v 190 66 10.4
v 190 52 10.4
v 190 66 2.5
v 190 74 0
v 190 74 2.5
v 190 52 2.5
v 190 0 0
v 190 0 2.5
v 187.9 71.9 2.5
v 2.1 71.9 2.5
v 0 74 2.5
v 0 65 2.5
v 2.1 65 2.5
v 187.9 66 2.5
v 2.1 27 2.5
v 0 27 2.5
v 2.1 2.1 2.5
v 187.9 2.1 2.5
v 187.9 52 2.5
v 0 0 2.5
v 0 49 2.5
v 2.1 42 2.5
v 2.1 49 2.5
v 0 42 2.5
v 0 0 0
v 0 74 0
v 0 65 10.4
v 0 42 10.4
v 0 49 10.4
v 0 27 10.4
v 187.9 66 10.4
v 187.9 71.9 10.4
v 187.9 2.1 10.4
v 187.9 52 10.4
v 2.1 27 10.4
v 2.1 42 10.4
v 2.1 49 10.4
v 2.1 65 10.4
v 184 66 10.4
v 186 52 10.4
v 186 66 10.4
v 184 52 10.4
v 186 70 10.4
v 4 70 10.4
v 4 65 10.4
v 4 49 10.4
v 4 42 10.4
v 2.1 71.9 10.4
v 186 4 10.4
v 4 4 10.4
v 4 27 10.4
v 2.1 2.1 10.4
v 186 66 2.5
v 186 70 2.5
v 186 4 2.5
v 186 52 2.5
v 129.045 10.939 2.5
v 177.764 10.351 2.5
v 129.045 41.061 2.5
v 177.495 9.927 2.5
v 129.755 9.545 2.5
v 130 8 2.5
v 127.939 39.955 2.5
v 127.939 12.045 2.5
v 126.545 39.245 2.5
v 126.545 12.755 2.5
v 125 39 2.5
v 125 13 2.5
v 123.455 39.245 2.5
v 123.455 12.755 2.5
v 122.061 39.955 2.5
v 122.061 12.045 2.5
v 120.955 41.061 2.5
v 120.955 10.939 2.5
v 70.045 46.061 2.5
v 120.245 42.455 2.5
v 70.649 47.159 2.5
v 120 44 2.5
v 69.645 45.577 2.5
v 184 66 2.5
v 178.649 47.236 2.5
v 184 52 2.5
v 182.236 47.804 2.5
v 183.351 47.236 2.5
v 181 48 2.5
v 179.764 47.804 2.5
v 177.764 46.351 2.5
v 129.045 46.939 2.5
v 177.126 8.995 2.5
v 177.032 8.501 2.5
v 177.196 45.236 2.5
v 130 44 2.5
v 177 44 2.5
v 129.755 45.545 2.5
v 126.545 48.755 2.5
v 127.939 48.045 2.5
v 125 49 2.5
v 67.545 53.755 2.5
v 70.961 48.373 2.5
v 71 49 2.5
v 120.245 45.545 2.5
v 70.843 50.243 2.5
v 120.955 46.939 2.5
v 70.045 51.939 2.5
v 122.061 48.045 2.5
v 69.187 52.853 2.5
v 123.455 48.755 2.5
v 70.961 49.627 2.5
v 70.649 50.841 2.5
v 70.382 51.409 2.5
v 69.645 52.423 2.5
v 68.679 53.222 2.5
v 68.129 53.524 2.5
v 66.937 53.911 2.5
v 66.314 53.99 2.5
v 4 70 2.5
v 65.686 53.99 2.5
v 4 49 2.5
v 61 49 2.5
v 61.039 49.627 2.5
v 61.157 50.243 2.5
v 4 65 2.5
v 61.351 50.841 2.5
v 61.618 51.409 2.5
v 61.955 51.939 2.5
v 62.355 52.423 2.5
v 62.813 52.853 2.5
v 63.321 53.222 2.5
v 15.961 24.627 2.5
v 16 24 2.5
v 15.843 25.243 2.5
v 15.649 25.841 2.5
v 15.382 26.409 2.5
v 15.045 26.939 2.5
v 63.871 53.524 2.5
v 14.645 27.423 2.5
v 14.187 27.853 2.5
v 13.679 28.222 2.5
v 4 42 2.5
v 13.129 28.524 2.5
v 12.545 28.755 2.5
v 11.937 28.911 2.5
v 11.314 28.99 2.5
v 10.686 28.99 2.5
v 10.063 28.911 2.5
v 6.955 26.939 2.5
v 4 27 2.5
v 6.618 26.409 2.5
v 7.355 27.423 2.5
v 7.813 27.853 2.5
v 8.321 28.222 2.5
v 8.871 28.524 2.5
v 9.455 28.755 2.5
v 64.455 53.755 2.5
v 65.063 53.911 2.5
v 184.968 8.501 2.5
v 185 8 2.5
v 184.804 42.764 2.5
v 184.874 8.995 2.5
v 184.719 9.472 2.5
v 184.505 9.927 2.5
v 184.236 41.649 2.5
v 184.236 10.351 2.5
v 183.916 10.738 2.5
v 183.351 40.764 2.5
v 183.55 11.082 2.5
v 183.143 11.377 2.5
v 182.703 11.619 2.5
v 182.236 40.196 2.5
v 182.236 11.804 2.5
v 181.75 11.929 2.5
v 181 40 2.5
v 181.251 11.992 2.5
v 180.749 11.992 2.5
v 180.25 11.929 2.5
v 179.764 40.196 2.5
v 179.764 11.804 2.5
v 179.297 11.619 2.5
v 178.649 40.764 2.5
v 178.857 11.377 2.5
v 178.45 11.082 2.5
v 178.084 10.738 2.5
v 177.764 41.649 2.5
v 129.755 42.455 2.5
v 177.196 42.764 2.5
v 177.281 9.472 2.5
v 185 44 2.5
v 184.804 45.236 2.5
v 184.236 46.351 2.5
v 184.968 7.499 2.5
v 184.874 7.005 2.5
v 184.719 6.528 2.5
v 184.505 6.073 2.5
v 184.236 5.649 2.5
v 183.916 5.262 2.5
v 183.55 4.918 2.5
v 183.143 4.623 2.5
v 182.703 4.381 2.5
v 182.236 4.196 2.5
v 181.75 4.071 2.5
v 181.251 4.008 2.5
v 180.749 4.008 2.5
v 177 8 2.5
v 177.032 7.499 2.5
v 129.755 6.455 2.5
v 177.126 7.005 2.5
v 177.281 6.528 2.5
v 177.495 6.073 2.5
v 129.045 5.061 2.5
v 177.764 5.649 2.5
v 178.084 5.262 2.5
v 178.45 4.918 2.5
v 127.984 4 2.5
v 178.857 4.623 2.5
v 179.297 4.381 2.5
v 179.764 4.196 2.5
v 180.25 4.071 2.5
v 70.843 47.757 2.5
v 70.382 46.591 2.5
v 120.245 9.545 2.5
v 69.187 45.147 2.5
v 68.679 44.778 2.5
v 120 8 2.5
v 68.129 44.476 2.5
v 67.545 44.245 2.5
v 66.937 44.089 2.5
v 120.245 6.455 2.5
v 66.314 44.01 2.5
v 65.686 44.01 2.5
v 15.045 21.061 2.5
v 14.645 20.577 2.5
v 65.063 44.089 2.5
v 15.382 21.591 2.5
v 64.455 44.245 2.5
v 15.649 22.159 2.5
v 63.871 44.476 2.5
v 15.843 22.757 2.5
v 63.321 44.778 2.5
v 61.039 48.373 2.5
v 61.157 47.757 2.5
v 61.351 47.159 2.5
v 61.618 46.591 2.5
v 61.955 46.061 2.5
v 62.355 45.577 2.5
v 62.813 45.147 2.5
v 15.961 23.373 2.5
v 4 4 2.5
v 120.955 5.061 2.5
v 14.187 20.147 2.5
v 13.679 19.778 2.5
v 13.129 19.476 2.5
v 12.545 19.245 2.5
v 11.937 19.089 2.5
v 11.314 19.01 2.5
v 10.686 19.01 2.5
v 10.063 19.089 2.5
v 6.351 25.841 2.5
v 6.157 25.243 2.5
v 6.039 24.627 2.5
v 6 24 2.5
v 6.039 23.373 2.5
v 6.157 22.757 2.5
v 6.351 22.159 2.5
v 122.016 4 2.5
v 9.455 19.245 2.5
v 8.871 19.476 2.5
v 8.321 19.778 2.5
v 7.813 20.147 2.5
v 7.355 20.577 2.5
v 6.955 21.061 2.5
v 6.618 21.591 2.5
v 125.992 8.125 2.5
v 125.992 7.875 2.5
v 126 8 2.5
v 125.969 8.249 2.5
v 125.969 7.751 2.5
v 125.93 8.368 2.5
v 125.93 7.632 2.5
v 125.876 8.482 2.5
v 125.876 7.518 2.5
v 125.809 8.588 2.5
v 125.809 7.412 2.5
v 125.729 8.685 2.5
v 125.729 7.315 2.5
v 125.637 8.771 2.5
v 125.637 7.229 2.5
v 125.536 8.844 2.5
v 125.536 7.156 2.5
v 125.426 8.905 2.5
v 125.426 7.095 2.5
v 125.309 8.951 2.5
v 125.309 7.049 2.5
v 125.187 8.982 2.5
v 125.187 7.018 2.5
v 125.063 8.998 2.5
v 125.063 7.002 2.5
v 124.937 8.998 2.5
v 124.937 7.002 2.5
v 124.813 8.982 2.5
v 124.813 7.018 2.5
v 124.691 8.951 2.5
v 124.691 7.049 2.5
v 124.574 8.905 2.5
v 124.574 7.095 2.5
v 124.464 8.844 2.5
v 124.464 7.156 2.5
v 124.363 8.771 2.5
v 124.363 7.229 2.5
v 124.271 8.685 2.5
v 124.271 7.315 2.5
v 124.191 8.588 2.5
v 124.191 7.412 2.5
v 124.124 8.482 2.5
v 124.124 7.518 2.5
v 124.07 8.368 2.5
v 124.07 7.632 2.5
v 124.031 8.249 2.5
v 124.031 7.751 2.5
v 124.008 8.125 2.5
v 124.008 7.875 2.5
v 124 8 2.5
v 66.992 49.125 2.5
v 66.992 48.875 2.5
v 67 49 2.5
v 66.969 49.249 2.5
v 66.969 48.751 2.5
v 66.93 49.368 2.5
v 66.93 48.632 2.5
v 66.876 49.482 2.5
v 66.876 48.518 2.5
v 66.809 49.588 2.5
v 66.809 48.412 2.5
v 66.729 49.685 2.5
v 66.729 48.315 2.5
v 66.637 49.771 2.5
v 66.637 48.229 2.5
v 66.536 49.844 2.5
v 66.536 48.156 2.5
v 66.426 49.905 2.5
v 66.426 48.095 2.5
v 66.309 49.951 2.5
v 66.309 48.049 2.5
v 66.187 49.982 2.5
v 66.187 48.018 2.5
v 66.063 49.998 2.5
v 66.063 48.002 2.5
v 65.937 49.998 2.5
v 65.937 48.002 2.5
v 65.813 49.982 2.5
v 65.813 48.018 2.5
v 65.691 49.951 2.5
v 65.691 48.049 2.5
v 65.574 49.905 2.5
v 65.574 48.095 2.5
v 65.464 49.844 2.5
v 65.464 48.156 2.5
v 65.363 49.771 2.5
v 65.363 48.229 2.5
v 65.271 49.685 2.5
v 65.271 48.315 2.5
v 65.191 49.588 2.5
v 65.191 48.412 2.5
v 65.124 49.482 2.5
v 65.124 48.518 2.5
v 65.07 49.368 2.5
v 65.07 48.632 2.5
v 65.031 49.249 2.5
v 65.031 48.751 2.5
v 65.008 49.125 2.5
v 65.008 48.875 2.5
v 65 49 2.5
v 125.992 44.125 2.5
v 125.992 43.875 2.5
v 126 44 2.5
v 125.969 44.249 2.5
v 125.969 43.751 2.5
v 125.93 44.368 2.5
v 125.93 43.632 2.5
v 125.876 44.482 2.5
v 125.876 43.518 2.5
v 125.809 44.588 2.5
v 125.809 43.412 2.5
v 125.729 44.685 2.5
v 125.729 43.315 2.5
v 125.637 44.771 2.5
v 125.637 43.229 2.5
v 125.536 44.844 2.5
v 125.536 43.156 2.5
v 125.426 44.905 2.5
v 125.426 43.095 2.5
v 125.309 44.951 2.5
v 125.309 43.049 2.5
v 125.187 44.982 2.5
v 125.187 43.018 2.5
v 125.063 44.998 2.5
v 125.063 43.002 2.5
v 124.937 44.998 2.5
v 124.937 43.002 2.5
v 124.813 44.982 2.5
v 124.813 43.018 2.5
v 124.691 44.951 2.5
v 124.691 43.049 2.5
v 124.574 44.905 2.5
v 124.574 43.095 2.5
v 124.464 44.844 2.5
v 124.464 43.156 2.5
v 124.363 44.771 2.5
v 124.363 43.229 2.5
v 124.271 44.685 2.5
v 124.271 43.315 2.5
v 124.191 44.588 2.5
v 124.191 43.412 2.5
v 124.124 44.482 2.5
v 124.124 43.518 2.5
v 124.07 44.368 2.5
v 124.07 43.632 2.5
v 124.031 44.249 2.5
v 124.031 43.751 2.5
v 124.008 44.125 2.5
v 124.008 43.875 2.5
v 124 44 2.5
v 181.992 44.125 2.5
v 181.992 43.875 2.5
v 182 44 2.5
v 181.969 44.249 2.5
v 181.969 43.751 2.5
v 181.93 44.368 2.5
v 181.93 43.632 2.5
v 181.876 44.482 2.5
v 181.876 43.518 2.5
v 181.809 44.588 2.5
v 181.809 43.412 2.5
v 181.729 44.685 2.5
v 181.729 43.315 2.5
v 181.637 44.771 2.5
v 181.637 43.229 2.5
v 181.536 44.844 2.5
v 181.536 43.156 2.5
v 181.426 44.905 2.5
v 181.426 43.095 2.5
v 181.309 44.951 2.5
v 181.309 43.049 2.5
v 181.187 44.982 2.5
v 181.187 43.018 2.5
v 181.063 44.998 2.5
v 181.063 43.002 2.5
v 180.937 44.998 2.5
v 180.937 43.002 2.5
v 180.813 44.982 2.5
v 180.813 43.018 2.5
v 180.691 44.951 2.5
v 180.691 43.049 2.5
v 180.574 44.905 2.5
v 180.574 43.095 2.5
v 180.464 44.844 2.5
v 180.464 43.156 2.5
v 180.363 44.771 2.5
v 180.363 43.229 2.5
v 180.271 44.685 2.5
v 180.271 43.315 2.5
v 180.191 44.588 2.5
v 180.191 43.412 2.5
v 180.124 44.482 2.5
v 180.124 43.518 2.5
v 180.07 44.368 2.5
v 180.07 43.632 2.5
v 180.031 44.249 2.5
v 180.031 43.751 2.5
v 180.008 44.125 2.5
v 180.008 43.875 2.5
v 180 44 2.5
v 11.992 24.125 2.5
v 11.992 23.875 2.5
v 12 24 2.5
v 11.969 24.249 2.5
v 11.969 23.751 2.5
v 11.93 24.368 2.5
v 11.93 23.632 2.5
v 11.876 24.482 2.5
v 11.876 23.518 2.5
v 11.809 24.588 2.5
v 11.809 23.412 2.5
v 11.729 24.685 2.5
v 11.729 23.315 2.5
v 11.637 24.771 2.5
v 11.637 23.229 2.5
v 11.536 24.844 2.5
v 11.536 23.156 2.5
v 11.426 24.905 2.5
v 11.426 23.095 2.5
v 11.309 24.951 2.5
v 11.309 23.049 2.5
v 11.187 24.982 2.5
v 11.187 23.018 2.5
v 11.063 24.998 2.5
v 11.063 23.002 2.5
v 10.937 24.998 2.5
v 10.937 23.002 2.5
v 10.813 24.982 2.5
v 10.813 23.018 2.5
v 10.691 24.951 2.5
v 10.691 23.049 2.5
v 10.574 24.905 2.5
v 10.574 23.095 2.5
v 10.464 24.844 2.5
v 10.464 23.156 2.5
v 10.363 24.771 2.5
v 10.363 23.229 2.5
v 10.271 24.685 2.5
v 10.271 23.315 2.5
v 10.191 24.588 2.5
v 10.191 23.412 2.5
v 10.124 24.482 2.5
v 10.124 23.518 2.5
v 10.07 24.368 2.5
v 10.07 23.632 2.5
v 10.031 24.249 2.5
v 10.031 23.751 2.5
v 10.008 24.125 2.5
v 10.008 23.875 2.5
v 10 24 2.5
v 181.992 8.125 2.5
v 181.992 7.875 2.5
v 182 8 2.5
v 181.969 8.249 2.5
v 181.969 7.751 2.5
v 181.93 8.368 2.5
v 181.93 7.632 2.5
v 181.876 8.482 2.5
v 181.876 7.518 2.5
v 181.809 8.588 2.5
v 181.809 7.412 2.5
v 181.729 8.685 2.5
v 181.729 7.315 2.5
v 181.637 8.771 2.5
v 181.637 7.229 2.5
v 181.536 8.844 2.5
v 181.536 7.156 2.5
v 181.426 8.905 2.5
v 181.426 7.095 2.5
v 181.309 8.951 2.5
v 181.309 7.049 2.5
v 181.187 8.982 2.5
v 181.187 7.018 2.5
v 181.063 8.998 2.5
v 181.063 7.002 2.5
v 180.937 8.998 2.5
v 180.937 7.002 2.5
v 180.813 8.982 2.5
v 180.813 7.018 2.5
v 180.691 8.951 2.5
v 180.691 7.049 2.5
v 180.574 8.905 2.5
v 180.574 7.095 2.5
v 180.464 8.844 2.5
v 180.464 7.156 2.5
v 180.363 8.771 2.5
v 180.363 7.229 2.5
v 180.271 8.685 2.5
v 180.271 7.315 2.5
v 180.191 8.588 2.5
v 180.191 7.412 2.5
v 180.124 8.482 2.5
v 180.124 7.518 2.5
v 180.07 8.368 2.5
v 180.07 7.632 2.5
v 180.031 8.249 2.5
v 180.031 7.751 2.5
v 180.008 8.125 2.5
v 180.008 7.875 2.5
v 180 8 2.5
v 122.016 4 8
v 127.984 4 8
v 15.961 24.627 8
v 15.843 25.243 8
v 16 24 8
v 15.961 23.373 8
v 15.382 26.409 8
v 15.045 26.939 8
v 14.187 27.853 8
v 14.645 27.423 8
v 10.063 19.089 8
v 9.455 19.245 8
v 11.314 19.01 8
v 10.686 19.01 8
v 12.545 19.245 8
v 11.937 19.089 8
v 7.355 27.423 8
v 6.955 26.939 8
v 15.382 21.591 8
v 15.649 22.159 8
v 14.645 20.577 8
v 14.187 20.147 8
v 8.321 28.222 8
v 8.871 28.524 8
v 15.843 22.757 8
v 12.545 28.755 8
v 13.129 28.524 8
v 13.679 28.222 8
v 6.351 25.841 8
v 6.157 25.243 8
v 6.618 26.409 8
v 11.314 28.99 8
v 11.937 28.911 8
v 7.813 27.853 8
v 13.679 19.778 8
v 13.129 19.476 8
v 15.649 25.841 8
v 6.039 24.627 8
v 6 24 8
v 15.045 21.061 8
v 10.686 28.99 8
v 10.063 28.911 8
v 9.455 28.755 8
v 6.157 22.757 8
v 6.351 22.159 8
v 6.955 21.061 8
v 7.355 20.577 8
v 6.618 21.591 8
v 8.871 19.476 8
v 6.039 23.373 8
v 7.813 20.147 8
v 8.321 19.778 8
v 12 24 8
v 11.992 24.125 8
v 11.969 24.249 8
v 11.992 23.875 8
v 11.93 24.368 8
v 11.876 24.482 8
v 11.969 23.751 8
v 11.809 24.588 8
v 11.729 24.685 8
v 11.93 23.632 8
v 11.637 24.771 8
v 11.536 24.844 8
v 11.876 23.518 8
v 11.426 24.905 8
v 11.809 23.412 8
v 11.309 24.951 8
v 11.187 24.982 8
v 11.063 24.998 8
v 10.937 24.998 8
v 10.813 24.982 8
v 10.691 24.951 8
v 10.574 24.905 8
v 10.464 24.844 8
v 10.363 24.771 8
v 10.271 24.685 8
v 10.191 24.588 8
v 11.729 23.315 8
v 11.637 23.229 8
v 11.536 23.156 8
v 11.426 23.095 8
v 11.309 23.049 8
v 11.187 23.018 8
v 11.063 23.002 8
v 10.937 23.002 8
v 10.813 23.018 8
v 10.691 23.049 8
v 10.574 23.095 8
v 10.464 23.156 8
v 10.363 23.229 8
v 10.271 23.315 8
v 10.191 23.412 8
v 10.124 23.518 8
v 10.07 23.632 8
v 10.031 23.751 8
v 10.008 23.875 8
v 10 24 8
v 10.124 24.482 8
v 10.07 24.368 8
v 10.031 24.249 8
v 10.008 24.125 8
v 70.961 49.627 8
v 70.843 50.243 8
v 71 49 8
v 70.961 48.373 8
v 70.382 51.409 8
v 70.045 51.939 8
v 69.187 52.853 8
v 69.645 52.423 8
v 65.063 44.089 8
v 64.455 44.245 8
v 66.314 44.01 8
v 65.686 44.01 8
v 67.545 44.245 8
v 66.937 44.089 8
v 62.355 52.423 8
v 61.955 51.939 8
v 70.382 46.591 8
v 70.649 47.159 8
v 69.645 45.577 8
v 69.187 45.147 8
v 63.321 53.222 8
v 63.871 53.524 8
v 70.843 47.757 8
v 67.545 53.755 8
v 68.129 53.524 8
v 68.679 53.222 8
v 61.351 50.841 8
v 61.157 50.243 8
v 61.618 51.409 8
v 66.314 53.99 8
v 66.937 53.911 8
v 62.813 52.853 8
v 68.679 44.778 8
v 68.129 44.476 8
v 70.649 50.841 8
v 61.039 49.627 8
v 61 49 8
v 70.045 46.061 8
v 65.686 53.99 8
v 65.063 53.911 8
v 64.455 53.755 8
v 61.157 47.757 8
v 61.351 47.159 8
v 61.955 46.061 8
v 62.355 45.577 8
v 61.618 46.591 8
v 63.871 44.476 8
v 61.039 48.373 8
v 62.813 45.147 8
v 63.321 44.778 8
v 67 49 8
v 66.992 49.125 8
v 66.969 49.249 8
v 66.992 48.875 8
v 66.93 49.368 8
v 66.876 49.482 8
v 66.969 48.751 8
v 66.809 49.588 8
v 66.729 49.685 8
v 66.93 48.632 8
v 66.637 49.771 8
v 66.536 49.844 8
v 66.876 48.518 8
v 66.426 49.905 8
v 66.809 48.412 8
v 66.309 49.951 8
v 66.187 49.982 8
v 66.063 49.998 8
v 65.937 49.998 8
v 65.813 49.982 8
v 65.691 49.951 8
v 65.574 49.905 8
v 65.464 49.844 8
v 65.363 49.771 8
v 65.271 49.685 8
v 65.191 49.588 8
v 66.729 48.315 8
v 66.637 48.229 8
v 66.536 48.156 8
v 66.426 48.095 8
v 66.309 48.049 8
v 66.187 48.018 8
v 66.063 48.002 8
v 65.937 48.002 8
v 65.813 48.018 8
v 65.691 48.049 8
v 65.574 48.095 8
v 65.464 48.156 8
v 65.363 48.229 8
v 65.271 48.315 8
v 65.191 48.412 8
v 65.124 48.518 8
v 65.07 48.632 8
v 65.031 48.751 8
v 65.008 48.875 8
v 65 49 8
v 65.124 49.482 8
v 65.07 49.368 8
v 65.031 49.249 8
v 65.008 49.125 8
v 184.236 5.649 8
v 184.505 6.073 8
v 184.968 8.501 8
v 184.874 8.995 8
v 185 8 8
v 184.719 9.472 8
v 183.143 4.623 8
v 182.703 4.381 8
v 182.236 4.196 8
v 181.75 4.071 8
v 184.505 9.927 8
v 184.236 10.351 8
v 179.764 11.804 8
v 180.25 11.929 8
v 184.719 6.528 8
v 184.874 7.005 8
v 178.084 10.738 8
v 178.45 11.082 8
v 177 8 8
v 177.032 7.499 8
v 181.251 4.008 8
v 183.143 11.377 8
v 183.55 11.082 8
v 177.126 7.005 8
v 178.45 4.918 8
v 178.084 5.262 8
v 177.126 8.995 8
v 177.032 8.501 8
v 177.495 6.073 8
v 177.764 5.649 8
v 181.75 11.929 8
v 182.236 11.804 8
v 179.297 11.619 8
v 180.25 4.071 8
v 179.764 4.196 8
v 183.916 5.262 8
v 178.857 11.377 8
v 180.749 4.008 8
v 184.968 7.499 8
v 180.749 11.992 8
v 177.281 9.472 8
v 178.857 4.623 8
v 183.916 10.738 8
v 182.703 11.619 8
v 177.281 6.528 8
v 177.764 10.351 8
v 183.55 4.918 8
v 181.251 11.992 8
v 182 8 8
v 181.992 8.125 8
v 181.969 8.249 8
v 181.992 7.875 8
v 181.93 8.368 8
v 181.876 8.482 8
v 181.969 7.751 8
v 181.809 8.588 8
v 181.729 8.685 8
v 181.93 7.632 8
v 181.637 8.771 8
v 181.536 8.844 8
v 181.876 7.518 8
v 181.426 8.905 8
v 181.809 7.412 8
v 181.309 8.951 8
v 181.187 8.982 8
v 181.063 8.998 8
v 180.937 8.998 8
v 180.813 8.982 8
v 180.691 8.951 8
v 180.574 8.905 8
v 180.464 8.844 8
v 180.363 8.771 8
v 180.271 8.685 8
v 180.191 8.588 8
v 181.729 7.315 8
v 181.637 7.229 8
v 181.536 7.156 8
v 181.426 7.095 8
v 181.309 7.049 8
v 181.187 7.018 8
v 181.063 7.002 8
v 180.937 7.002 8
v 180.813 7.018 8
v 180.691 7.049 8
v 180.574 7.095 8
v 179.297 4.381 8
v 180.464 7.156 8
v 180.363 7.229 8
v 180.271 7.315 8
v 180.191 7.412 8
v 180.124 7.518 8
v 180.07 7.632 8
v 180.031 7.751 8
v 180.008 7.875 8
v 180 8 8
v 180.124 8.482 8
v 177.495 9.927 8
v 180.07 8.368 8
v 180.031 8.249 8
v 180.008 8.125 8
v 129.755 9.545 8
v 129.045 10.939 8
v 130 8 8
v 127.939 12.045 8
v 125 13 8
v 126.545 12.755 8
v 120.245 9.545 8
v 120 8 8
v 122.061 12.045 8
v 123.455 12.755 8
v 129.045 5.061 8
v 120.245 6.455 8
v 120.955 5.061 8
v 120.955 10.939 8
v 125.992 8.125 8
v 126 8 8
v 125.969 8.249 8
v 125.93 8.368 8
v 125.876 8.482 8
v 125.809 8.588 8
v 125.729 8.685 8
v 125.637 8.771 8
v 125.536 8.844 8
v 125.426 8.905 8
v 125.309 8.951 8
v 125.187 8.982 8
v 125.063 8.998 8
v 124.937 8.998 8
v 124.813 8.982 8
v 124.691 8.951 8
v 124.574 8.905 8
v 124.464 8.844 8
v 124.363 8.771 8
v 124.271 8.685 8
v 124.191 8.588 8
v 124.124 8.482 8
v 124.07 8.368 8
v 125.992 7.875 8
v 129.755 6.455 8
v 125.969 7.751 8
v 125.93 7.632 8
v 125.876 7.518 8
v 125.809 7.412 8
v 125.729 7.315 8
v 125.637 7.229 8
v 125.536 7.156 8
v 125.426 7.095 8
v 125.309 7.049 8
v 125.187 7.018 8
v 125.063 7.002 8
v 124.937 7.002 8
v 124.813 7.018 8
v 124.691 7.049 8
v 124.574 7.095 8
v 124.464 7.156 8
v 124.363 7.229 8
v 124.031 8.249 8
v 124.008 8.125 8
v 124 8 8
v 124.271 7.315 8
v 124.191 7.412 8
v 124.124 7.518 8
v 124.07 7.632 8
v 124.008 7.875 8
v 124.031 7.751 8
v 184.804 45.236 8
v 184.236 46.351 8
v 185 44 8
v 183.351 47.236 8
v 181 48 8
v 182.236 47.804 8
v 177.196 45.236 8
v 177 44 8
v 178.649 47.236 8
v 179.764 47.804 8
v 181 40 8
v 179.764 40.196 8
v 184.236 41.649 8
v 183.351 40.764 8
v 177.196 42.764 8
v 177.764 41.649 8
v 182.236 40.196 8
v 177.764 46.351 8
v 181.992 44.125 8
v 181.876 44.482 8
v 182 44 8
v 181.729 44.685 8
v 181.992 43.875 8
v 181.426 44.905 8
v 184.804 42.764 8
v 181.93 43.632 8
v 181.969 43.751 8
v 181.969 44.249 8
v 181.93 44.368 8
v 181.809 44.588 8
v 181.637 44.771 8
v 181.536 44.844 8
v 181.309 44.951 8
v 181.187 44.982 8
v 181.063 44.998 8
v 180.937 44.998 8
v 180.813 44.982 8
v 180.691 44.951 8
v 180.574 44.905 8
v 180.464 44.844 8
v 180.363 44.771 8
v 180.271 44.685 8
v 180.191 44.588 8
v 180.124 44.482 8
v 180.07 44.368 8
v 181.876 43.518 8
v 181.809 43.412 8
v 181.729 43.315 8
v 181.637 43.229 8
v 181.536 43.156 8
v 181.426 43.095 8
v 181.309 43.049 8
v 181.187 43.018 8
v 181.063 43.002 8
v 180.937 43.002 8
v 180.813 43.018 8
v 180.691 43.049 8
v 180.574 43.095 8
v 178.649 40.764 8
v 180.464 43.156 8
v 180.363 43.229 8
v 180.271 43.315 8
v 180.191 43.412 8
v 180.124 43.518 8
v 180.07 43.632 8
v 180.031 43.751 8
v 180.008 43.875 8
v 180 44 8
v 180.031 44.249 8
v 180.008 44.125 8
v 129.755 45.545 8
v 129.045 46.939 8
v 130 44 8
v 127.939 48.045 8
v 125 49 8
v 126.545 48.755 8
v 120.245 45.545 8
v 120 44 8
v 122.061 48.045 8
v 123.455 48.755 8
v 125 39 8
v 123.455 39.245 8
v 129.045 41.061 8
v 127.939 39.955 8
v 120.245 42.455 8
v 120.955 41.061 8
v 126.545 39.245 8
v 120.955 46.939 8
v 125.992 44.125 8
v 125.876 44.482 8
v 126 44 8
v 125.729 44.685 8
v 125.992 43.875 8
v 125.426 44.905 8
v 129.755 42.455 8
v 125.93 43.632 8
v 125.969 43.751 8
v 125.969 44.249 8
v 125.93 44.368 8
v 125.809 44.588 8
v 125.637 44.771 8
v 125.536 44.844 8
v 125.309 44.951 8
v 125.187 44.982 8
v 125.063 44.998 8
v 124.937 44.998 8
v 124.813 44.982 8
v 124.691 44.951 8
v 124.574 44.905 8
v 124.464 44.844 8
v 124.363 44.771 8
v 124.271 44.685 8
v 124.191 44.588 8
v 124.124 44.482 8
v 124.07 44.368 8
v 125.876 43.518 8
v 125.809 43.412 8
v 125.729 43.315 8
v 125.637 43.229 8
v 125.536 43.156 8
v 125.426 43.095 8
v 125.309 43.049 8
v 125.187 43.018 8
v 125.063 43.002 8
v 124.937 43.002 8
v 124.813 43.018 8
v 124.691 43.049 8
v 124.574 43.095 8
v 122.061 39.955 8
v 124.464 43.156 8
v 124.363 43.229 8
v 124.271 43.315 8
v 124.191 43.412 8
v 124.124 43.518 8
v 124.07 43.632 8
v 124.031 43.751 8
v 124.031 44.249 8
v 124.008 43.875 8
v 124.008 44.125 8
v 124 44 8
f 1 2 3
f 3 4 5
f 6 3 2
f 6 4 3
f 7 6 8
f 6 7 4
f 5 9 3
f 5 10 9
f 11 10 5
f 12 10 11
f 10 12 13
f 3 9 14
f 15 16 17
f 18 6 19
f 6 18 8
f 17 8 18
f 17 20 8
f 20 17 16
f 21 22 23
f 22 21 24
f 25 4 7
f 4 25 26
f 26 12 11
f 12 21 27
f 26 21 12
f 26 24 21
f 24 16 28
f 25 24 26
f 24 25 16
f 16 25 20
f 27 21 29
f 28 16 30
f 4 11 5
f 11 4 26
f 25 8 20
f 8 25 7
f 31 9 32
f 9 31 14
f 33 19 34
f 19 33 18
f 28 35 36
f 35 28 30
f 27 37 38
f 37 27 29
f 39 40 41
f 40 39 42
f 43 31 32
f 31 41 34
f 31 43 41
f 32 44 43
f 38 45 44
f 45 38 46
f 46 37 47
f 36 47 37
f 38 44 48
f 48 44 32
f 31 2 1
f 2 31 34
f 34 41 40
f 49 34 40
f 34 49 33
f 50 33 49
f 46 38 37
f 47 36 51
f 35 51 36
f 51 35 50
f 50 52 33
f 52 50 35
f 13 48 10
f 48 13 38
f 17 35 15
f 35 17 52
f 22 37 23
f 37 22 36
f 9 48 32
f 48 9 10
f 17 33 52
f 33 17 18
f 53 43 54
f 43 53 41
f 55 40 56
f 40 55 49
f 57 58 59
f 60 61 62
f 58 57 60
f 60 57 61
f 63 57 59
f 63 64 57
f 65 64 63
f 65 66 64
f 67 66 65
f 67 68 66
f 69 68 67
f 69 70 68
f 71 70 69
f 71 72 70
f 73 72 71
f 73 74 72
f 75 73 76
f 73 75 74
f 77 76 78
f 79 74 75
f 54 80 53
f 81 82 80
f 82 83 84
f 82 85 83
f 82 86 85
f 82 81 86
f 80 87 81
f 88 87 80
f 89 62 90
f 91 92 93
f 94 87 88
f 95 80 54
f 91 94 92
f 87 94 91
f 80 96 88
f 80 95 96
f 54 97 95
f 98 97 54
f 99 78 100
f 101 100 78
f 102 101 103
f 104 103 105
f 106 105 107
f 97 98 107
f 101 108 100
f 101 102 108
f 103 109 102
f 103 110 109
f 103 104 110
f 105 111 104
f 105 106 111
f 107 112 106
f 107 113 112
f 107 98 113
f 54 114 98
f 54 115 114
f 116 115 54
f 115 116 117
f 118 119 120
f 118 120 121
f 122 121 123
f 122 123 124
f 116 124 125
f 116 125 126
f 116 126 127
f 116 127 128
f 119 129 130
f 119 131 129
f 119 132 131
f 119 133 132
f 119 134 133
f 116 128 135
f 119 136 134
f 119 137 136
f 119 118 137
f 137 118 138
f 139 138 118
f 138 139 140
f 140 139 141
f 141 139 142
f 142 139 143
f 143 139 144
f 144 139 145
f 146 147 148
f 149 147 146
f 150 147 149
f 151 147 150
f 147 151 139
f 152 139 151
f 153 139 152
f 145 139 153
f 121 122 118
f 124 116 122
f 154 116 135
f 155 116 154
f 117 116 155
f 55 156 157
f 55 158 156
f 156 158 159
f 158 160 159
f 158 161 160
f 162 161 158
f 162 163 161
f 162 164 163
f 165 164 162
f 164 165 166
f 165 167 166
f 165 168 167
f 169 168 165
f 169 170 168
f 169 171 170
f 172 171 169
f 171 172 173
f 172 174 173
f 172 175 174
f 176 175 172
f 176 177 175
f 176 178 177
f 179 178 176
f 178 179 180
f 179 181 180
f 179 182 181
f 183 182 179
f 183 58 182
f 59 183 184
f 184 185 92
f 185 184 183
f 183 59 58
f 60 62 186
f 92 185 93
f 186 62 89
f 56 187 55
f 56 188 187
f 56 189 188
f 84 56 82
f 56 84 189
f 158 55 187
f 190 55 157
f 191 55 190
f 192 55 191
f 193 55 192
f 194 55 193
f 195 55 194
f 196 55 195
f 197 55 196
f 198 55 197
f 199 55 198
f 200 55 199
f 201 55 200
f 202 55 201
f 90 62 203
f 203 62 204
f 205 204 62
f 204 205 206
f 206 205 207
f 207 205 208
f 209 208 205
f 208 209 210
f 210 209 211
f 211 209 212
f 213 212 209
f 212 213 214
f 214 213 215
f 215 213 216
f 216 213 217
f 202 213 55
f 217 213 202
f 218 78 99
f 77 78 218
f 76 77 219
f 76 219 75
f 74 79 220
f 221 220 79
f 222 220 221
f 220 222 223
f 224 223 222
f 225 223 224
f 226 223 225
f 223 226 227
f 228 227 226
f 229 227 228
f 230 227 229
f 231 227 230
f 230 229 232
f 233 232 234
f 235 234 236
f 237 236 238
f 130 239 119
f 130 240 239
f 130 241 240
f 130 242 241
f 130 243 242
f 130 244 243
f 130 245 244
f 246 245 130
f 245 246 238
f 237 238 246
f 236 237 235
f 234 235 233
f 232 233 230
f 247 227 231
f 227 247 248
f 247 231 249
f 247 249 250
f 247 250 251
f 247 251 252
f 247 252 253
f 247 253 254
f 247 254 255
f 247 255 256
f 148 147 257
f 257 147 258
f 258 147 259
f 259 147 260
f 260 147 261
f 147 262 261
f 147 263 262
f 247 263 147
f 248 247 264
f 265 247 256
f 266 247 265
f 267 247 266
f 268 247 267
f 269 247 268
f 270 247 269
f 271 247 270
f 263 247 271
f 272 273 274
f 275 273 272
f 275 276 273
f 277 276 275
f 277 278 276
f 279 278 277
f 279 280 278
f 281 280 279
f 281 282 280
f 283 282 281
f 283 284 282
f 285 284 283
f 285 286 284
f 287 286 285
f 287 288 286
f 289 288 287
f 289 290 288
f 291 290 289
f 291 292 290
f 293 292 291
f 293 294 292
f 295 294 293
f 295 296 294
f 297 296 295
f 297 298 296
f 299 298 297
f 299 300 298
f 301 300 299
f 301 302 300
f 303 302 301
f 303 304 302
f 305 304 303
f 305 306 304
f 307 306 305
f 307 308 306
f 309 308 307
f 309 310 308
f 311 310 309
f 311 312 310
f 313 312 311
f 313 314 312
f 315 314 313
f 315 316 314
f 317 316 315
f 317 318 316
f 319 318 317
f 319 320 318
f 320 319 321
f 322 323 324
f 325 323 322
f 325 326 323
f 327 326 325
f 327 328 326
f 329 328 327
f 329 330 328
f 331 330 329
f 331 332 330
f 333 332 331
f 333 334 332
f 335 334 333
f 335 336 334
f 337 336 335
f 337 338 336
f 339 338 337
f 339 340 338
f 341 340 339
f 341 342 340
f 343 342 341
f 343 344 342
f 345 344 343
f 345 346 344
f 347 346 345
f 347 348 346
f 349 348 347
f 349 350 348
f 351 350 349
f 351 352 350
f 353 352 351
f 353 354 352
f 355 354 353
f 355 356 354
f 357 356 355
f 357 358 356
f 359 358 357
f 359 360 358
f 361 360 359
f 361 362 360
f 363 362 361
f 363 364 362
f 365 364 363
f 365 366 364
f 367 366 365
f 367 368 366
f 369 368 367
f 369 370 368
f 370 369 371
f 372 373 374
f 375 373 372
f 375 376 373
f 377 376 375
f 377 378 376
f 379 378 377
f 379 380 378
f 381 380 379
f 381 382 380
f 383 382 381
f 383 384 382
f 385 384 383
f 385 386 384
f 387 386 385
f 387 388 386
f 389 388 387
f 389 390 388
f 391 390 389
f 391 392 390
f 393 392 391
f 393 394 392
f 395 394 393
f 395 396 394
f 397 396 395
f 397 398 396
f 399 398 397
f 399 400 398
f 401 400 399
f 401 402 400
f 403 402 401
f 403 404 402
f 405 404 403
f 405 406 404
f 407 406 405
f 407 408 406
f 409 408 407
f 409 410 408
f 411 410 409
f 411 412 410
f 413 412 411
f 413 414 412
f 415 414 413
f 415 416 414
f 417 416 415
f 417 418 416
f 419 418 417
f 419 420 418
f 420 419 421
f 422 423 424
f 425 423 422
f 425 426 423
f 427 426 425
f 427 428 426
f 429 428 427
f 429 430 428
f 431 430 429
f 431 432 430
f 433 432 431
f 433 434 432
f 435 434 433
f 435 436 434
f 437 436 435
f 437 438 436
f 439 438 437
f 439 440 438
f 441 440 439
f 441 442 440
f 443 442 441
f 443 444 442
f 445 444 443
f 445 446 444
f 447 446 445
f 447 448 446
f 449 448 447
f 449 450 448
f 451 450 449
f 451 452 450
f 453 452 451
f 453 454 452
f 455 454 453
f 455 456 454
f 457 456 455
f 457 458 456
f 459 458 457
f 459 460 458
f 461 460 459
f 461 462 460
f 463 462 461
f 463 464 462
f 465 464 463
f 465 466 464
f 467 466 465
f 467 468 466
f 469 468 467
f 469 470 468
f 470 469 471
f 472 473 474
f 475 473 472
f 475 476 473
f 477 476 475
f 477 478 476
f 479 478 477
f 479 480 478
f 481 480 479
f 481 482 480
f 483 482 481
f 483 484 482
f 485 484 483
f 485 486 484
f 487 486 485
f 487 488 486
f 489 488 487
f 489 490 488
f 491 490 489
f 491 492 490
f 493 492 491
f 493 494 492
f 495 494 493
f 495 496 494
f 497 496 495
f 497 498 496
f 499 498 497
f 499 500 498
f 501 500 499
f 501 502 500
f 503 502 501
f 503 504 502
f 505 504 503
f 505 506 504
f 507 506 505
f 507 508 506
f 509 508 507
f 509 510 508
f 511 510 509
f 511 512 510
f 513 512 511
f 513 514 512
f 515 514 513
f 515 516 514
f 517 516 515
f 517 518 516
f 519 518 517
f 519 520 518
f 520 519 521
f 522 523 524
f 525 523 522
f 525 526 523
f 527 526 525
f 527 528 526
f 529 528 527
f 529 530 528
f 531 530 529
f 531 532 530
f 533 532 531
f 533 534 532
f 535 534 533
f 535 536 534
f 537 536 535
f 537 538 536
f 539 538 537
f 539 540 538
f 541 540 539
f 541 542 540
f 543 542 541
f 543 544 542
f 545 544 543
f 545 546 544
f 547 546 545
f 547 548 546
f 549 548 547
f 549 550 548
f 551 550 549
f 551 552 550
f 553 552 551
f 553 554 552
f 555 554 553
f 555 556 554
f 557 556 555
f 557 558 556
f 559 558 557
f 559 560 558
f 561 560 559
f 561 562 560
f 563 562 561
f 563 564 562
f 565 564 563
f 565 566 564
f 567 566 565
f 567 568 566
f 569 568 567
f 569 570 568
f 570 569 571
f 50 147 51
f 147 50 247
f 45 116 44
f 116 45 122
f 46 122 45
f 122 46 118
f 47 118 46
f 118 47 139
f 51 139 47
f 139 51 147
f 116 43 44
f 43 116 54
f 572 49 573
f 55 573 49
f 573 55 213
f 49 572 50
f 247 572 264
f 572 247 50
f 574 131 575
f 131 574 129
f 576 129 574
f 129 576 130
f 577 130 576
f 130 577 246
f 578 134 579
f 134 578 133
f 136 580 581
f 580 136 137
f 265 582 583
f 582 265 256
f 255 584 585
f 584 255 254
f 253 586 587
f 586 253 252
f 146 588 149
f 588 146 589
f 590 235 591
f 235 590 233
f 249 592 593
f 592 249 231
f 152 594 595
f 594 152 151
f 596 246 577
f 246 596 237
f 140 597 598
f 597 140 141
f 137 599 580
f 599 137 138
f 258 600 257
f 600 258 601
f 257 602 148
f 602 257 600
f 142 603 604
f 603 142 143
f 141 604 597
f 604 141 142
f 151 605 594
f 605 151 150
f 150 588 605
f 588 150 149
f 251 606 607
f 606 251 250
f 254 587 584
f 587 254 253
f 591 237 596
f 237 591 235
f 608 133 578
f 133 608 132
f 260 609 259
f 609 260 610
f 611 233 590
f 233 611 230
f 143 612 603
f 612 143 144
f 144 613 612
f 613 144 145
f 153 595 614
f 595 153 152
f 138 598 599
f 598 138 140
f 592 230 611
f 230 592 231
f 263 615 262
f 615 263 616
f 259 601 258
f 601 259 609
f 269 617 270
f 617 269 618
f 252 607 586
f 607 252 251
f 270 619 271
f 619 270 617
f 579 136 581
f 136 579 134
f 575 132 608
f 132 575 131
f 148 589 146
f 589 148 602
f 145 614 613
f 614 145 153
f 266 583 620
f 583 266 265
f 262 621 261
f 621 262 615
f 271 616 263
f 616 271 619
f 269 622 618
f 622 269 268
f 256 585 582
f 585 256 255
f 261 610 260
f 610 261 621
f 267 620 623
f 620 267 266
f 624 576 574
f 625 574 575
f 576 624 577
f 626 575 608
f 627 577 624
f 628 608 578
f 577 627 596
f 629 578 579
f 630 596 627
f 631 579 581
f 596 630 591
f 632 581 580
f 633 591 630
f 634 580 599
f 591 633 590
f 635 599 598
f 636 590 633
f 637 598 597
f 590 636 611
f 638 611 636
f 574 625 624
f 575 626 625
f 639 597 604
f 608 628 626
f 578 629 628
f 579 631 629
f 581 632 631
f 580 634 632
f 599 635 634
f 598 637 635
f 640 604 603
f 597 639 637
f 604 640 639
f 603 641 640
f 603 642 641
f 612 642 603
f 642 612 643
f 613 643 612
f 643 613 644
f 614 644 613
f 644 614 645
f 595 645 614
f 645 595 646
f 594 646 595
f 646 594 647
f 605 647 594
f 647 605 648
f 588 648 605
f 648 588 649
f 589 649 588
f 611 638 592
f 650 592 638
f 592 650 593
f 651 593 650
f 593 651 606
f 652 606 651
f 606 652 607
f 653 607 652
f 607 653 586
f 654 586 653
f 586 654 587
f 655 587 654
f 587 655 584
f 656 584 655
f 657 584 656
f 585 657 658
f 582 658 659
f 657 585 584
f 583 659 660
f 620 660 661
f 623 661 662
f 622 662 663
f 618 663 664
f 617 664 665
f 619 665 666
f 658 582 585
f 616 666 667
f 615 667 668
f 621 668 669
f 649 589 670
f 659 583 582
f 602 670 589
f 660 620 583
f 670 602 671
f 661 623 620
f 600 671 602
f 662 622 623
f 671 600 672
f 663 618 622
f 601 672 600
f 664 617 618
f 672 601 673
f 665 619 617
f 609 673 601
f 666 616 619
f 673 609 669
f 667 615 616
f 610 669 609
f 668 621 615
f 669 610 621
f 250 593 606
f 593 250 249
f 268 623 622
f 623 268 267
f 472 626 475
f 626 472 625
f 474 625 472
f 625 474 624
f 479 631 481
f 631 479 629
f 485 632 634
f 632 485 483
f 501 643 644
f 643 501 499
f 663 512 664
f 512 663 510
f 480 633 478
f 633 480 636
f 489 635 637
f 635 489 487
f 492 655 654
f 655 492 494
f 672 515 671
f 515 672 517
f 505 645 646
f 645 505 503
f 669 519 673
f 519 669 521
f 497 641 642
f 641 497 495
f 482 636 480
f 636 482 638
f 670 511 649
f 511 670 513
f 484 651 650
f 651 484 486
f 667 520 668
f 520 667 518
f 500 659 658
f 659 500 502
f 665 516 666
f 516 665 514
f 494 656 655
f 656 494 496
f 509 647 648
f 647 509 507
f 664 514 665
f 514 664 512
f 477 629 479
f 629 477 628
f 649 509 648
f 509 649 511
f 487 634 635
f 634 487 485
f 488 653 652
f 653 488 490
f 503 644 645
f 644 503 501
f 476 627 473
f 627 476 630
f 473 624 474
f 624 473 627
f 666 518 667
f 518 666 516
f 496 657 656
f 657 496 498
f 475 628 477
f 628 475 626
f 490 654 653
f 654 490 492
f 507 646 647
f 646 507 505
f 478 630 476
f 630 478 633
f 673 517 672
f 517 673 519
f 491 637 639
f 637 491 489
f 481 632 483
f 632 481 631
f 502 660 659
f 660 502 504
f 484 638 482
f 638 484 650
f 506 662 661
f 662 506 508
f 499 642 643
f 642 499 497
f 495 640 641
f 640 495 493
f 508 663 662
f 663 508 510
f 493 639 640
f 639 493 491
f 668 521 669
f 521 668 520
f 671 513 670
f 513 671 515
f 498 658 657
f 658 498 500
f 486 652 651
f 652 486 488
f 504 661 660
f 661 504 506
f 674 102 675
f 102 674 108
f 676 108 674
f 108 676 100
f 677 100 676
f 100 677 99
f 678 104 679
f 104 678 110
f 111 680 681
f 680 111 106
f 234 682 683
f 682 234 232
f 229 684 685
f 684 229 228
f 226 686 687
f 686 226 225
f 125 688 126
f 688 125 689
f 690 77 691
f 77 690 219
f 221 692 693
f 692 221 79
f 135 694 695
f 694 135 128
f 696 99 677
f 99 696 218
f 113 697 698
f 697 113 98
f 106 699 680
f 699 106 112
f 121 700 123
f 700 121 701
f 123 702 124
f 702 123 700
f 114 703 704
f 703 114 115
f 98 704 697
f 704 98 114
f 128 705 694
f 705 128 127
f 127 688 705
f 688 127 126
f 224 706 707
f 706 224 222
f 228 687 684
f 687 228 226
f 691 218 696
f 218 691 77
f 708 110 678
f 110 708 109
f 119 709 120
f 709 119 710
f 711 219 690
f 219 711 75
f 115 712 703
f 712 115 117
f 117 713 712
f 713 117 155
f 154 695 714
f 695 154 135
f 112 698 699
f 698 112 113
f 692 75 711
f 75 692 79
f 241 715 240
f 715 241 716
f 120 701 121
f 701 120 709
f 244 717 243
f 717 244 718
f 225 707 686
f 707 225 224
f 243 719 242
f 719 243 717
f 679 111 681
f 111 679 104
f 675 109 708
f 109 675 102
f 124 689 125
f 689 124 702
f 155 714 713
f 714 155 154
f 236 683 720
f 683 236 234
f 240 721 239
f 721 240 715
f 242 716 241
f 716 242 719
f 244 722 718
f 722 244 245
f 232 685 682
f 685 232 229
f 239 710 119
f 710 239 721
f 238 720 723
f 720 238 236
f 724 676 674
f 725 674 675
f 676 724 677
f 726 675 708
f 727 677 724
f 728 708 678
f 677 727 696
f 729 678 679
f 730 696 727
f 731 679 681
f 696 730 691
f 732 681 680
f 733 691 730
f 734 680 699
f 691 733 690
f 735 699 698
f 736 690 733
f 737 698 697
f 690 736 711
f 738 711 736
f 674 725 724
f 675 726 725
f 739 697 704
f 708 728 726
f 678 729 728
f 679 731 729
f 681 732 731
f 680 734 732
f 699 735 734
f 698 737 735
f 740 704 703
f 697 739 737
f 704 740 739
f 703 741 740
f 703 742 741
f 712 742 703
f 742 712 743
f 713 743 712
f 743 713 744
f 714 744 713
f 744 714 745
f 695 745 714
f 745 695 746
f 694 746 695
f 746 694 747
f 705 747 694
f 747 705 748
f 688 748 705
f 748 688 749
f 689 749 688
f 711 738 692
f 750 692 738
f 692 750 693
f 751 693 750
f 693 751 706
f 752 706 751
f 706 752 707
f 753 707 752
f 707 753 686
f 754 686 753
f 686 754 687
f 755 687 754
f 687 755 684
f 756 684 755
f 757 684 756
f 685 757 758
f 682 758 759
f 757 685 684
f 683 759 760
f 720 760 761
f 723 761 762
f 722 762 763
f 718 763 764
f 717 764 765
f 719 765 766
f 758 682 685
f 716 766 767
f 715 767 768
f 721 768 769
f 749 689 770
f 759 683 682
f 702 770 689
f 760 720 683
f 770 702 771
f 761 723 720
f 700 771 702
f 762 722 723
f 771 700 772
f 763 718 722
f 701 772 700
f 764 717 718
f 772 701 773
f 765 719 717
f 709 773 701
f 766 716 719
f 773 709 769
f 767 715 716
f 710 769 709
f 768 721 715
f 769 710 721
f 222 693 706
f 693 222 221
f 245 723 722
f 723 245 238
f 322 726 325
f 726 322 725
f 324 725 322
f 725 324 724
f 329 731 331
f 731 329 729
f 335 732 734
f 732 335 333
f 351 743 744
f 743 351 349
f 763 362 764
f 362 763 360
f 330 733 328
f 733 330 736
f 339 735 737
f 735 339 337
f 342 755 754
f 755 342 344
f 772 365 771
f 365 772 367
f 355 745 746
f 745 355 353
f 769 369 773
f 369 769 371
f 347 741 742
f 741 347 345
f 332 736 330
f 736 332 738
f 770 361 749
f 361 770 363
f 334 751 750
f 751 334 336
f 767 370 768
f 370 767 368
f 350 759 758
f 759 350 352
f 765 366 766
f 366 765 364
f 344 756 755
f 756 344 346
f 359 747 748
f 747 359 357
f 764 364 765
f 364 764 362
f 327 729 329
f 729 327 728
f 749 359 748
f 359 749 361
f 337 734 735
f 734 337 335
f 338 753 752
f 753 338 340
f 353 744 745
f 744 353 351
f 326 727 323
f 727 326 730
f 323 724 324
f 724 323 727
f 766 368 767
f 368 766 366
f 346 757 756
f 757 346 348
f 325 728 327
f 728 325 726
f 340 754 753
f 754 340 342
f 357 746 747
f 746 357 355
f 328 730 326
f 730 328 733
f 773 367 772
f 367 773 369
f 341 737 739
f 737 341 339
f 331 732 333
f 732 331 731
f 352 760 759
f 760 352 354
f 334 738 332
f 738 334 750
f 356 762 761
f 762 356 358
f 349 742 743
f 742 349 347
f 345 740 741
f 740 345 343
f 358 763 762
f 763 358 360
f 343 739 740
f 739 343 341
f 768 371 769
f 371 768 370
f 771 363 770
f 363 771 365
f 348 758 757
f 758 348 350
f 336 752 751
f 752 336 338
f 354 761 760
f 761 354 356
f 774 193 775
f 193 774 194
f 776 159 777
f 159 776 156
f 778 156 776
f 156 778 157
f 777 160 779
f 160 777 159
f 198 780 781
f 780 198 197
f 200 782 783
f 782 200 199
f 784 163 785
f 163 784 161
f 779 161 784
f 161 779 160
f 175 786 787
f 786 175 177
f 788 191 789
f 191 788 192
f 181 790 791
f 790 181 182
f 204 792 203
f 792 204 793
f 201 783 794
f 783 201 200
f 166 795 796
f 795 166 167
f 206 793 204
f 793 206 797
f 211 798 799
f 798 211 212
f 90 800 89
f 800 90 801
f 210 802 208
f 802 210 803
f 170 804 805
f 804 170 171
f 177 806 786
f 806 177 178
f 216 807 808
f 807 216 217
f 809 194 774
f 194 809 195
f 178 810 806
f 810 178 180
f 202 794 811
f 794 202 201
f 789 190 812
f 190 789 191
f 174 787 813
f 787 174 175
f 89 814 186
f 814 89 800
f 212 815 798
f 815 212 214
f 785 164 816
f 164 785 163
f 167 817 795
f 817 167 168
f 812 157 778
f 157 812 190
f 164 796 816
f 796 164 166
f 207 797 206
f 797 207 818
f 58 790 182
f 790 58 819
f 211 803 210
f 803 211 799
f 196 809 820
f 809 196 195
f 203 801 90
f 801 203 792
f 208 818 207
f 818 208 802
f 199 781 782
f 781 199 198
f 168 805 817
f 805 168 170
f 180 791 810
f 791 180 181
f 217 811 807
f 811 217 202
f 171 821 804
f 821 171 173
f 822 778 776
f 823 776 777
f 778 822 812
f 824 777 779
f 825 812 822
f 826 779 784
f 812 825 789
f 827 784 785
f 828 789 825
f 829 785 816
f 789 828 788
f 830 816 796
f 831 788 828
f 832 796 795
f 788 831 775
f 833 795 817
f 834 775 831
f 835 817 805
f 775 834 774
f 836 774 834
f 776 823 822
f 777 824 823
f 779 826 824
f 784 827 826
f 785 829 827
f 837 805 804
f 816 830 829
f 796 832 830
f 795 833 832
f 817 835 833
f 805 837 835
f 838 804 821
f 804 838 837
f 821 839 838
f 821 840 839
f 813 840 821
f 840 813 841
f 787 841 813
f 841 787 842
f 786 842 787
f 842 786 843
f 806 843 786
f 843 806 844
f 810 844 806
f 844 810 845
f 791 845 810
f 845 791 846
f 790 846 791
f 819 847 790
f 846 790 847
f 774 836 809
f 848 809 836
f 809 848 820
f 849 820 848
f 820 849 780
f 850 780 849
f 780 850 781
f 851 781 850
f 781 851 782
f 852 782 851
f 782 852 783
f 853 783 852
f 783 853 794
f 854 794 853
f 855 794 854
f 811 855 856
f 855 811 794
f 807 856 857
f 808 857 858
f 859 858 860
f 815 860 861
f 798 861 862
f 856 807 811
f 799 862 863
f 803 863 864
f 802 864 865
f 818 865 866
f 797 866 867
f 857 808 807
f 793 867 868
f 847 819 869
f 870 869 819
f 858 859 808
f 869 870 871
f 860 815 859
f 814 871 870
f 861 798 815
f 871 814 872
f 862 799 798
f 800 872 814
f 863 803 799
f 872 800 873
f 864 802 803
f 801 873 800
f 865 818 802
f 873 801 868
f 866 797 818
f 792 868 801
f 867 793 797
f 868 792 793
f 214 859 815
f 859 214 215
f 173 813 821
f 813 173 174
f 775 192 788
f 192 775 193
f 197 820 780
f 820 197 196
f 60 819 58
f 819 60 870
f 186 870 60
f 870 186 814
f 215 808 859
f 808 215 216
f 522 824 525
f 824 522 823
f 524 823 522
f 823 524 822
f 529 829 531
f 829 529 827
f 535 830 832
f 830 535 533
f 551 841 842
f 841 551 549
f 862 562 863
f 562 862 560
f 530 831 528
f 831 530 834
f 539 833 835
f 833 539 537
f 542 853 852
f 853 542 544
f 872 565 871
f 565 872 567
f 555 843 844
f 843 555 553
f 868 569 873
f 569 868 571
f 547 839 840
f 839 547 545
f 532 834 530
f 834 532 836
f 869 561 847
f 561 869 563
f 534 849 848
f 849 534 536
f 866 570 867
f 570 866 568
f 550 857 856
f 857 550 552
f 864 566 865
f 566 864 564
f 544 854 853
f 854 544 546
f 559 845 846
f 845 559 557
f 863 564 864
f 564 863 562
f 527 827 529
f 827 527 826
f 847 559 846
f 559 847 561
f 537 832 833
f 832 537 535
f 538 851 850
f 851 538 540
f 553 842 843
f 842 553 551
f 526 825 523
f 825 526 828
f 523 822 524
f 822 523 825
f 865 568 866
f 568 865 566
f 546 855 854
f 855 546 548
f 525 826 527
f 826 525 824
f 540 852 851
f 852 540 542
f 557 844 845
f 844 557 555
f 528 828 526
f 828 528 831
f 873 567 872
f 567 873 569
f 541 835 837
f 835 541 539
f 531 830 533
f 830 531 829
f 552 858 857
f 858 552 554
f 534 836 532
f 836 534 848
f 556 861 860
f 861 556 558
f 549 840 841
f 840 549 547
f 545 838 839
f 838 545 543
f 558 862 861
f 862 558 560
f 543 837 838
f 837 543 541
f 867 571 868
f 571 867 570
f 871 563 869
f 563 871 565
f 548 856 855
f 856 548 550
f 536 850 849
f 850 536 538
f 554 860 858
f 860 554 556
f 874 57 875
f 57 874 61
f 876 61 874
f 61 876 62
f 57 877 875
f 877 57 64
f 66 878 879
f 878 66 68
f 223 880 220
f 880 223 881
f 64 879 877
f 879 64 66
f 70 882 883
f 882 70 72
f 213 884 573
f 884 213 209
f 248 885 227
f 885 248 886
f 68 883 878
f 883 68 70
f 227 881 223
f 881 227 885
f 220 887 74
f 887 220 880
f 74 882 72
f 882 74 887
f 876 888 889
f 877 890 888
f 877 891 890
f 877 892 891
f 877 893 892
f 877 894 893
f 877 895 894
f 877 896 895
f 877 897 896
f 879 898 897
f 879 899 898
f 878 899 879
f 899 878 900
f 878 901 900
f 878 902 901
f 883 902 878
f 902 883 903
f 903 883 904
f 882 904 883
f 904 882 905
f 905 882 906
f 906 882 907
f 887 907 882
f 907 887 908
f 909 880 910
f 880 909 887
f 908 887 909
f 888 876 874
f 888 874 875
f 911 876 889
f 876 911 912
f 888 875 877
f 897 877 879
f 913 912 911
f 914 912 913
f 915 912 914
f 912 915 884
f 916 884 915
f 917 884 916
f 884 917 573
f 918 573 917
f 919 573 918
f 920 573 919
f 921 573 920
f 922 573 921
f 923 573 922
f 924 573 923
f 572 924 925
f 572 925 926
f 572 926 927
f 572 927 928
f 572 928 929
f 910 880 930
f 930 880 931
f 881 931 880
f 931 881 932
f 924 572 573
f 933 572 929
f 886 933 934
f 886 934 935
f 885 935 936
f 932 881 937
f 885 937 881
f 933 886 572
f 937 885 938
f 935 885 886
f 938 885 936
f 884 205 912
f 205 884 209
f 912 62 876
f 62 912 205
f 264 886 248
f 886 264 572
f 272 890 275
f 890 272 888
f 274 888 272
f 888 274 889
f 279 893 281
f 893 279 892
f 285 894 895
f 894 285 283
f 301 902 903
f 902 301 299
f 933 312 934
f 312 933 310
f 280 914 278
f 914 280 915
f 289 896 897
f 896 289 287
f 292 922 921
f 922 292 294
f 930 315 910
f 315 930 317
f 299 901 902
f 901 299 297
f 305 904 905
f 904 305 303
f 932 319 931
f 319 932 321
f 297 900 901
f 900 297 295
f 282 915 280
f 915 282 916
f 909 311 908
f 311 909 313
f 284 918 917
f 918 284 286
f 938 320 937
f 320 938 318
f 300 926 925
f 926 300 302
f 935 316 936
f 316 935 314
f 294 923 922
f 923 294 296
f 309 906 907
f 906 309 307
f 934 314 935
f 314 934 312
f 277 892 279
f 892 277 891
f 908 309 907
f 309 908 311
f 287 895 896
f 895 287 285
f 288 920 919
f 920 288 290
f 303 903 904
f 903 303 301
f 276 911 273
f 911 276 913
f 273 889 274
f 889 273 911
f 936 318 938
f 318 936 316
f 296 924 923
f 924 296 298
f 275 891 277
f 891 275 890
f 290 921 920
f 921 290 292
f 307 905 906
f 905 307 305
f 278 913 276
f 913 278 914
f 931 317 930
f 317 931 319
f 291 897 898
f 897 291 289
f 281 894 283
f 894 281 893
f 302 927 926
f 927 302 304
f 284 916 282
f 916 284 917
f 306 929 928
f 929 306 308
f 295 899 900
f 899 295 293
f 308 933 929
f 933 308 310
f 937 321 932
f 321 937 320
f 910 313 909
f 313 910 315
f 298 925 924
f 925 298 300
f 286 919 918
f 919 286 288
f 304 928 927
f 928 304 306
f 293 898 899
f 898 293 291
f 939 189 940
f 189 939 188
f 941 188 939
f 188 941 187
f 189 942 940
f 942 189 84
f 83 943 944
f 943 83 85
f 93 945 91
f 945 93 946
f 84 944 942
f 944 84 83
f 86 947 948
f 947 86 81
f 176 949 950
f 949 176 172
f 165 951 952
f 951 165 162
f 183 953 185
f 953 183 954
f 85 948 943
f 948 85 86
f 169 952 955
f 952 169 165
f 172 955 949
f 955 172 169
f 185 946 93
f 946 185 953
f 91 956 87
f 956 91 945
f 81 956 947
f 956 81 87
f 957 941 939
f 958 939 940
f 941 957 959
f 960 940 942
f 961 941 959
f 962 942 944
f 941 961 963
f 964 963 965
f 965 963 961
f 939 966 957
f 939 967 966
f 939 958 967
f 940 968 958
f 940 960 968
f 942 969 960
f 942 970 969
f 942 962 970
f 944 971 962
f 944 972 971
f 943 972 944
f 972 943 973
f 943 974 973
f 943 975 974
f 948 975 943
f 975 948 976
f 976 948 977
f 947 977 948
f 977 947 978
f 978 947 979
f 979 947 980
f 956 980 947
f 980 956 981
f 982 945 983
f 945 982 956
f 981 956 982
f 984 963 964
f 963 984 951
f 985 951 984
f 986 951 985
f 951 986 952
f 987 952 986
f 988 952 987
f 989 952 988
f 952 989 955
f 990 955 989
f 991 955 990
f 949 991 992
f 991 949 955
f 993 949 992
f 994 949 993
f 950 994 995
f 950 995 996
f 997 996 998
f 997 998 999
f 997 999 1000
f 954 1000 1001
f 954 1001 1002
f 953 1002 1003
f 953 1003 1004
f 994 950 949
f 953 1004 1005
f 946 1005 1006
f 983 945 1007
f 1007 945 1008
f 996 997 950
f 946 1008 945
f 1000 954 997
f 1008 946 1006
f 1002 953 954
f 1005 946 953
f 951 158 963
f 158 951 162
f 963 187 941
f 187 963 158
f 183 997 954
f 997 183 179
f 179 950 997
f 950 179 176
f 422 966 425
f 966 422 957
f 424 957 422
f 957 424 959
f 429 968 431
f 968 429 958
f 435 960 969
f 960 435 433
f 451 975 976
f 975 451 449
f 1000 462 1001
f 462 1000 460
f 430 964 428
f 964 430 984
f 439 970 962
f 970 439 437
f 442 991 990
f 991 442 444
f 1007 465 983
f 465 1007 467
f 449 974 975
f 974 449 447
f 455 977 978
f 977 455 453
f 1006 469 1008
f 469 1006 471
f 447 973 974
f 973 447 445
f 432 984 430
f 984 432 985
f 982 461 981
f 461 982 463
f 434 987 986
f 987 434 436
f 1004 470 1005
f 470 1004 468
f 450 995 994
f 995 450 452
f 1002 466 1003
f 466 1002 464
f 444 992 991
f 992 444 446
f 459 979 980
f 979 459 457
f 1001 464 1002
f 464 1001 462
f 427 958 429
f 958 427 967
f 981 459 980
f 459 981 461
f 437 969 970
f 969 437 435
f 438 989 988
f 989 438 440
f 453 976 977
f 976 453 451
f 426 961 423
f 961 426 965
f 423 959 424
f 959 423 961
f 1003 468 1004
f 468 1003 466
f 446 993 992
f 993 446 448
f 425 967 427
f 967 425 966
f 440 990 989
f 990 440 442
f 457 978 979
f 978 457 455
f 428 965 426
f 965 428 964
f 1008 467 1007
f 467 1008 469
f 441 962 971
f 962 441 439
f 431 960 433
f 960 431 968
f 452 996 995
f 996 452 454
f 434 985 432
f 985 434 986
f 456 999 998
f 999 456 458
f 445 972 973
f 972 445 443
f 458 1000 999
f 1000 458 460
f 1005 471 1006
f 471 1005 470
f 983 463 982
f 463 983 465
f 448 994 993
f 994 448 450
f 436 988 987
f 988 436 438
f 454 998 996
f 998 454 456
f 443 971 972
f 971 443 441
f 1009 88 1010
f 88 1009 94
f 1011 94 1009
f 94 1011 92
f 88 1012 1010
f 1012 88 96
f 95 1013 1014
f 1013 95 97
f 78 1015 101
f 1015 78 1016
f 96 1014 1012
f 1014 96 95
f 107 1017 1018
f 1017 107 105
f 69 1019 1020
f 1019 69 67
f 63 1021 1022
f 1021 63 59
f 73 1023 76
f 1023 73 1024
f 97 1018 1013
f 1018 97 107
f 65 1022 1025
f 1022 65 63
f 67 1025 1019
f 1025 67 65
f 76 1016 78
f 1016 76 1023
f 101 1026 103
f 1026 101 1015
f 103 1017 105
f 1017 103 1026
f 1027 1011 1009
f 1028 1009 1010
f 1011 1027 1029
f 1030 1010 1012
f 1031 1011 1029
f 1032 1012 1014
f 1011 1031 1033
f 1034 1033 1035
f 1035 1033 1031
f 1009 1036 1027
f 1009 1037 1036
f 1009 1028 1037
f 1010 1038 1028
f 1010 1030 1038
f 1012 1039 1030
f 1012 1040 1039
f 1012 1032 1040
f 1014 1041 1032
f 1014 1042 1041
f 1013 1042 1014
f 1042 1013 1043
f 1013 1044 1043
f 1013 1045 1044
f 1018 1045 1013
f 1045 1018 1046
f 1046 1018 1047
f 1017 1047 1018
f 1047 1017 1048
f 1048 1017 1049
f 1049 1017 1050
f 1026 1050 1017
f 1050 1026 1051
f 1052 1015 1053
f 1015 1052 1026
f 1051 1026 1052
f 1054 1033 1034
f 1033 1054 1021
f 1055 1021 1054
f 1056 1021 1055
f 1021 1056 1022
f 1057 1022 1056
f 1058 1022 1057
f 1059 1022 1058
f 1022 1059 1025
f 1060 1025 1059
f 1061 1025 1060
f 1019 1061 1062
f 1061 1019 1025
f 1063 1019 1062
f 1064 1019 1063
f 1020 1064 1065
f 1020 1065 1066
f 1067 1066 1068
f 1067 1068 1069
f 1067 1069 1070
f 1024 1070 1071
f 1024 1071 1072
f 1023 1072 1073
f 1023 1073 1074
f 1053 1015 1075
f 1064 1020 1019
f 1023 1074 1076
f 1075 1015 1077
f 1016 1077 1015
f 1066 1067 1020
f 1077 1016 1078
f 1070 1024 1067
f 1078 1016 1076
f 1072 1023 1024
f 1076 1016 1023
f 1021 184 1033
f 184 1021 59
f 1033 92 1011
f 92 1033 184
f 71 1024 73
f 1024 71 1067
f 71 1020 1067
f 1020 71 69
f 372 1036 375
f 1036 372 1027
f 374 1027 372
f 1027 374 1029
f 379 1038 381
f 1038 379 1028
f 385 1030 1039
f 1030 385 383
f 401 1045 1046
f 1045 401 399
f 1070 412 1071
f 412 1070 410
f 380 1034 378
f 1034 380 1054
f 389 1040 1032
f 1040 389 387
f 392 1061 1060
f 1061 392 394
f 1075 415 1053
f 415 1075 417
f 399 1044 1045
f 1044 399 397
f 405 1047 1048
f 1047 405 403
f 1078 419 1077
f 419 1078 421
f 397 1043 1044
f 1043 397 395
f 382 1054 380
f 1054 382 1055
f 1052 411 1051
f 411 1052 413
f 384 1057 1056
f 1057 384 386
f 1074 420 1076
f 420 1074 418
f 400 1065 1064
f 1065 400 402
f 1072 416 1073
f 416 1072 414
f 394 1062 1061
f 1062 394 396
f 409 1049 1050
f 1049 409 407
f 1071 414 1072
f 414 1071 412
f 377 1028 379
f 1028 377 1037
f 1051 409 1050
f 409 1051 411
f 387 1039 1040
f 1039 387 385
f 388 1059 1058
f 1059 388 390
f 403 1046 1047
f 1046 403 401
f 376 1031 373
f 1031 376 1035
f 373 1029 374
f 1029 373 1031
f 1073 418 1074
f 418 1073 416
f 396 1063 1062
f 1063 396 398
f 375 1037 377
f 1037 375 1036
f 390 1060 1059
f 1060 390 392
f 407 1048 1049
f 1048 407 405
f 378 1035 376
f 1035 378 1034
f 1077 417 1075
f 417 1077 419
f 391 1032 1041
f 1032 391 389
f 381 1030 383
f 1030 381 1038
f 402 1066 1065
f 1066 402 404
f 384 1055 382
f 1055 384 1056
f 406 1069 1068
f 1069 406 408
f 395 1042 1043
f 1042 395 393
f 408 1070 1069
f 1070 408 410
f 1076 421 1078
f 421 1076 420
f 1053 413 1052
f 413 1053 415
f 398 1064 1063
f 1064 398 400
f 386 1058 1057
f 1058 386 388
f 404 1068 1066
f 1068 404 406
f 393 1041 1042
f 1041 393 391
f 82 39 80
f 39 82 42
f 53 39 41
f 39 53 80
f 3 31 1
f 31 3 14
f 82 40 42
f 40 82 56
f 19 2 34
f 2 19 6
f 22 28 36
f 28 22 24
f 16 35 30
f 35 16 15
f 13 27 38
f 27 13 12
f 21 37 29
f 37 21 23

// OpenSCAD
// Flipdot Display 
// Bottomplate of 3D Printed Casing
// RasperryPi B + Voltage Regulator Board
// CC4.0-BY SA NC   surasto.de

difference() {
  union() {
    cube(size=[190,74,2.5]);
    translate([2.1,2.1,2.4]) cube(size=[190-4.2,74-4.2,8]);
  }
  translate([4,4,2.5]) cube(size=[190-8,74-8,10]);
}

translate([190-6,74-22,2.4]) cube(size=[6,14,8]);

translate([0,27,2.4]) cube(size=[4,15,8]);
translate([0,49,2.4]) cube(size=[4,16,8]);


//Bolzen für Raspi 1
translate([11,24,2]) 
  difference() {
    cylinder(h=6, r=5, $fn=50);
    translate([0,0,0.1]) cylinder(h=6.5, r=1, $fn=50);
}

translate([11+55,24+25,2]) 
  difference() {
    cylinder(h=6, r=5, $fn=50);
    translate([0,0,0.1]) cylinder(h=6.5, r=1, $fn=50);
}

//Bolzen für Spannungsregler-Platine
translate([190-9,4+4,2]) 
  difference() {
    cylinder(h=6, r=4, $fn=50);
    translate([0,0,0.1]) cylinder(h=6.5, r=1, $fn=50);
}

translate([190-9-56,4+4,2]) 
  difference() {
    cylinder(h=6, r=5, $fn=20);
    translate([0,0,0.1]) cylinder(h=6.5, r=1, $fn=50);
}

translate([190-9,8+36,2]) 
  difference() {
    cylinder(h=6, r=4, $fn=20);
    translate([0,0,0.1]) cylinder(h=6.5, r=1, $fn=50);
}

translate([190-9-56,4+4+36,2]) 
  difference() {
    cylinder(h=6, r=5, $fn=20);
    translate([0,0,0.1]) cylinder(h=6.5, r=1, $fn=50);
} 
